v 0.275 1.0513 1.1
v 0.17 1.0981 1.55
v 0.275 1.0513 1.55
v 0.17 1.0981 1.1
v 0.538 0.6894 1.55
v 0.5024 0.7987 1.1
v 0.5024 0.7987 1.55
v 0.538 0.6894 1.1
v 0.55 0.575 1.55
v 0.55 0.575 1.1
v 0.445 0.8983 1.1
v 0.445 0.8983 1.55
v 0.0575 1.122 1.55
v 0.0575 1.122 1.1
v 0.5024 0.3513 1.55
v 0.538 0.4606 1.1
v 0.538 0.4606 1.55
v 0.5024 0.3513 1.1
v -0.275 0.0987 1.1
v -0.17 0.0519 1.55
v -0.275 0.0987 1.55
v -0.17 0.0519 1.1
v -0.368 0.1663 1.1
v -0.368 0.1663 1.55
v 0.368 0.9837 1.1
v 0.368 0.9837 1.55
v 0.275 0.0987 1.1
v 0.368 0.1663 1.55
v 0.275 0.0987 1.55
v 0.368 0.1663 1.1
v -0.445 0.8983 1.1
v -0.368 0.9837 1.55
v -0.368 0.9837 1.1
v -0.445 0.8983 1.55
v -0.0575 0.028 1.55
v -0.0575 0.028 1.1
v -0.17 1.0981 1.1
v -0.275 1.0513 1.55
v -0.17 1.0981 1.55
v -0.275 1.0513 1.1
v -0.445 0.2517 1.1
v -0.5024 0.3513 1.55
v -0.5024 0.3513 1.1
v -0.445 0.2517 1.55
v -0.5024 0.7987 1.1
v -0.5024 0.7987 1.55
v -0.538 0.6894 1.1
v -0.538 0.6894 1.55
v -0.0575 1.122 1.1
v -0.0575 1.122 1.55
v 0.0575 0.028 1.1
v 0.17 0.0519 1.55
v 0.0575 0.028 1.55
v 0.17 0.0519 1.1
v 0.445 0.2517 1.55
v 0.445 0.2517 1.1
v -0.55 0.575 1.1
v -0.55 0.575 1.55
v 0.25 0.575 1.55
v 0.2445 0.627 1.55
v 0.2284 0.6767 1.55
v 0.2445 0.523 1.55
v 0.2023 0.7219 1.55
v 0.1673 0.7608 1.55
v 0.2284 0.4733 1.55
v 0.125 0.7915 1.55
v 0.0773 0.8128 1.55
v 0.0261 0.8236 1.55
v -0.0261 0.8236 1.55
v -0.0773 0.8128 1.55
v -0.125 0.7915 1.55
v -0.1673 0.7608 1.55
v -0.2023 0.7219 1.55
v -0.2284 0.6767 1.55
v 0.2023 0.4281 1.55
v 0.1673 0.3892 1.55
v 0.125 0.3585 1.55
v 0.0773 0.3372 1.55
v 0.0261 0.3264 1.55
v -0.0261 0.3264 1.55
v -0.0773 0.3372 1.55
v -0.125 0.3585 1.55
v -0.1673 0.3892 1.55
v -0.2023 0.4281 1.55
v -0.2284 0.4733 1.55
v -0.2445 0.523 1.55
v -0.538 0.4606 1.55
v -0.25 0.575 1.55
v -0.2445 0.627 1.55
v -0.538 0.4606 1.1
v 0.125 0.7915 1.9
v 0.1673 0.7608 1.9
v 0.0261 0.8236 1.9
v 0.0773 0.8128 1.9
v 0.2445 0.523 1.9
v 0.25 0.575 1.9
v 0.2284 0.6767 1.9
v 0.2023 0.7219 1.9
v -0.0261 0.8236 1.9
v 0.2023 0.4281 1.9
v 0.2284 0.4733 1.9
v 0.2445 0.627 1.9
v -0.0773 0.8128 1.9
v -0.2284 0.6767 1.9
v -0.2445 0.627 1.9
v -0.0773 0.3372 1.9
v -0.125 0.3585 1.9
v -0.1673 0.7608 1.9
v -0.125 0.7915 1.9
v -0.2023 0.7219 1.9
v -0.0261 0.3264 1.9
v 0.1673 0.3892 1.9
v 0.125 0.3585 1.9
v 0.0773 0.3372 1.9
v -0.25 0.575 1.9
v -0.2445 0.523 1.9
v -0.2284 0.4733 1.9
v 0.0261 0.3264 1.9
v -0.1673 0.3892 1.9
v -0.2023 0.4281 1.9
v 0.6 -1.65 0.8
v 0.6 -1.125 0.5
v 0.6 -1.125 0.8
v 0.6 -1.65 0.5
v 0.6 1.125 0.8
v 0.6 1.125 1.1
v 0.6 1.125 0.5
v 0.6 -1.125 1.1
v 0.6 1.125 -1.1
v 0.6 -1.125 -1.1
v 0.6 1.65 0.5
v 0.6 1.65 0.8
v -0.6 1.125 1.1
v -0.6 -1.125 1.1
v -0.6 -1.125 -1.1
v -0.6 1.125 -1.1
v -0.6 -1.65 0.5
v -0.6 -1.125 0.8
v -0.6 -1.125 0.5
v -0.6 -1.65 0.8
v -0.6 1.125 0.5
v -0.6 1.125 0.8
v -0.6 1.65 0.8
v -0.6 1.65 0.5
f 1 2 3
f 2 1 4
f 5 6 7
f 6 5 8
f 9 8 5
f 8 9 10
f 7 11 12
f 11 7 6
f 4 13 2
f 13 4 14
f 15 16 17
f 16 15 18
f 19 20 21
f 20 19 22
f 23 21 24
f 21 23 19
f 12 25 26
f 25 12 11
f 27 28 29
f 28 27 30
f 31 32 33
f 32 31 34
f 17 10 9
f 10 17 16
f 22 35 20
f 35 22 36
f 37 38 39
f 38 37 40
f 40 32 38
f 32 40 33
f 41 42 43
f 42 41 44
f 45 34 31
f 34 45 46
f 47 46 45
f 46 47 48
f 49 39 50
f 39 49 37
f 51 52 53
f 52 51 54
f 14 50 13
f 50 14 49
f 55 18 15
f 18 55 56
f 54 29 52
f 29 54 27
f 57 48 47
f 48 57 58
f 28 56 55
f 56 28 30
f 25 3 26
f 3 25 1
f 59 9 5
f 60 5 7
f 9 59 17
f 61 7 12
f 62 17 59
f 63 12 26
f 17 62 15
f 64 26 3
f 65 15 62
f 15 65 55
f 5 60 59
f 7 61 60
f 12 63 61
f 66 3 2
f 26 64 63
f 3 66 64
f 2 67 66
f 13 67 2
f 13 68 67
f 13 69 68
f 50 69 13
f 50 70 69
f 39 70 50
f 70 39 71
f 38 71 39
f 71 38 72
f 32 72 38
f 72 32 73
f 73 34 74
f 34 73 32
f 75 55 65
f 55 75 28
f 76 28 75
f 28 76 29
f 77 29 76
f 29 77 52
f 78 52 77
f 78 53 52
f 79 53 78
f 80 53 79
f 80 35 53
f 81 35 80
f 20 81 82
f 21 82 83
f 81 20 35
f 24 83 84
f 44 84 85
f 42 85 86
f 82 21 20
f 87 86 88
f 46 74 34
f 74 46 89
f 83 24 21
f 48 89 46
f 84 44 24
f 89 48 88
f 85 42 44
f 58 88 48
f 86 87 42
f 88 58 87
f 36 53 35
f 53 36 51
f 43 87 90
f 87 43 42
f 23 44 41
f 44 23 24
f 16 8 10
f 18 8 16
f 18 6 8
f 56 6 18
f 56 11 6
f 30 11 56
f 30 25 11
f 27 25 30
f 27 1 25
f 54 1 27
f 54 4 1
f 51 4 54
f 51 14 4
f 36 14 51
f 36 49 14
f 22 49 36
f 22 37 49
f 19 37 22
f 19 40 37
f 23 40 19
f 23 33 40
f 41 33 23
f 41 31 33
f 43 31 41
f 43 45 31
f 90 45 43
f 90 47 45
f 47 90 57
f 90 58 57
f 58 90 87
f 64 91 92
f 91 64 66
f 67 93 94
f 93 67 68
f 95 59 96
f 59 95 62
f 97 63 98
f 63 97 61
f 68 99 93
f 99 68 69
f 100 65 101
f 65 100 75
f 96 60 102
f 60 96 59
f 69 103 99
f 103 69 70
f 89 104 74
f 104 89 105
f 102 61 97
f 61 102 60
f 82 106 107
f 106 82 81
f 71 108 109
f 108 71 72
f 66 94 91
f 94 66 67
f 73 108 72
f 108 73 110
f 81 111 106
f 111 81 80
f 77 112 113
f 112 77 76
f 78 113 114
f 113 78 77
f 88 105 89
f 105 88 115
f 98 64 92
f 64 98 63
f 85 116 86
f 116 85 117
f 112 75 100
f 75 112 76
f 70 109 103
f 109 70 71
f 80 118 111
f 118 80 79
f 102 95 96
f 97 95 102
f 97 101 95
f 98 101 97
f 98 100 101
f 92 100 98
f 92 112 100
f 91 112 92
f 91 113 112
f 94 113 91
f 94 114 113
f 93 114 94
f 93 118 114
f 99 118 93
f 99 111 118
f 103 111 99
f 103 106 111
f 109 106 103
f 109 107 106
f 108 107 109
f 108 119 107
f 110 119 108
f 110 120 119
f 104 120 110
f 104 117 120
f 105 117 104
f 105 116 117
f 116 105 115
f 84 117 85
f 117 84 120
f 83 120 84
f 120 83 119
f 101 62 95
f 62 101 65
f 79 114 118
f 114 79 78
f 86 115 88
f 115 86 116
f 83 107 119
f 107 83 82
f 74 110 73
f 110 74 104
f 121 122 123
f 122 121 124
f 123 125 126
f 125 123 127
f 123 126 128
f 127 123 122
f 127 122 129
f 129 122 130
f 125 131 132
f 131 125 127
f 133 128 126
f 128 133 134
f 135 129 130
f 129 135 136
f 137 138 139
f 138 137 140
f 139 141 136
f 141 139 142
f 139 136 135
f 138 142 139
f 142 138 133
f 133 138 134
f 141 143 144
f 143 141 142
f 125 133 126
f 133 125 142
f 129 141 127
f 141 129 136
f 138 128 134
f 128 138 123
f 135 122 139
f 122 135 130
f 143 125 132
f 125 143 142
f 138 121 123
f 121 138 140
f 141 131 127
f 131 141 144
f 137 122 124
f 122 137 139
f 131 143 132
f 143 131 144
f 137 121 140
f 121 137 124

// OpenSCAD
$fn = 30;
module sg90() {
	cube([1.2, 2.25, 2.2], center=true);
	translate([0,0,2.2/2-0.15-0.3]) cube([1.2, 3.3, 0.3], center=true);
	translate([0,2.25/2-1.1/2,2.2/2]){
		cylinder(d=1.1, h=.45);
		translate([0,0,.45]) cylinder(d=0.5, h=0.35);
	}
}
sg90();
